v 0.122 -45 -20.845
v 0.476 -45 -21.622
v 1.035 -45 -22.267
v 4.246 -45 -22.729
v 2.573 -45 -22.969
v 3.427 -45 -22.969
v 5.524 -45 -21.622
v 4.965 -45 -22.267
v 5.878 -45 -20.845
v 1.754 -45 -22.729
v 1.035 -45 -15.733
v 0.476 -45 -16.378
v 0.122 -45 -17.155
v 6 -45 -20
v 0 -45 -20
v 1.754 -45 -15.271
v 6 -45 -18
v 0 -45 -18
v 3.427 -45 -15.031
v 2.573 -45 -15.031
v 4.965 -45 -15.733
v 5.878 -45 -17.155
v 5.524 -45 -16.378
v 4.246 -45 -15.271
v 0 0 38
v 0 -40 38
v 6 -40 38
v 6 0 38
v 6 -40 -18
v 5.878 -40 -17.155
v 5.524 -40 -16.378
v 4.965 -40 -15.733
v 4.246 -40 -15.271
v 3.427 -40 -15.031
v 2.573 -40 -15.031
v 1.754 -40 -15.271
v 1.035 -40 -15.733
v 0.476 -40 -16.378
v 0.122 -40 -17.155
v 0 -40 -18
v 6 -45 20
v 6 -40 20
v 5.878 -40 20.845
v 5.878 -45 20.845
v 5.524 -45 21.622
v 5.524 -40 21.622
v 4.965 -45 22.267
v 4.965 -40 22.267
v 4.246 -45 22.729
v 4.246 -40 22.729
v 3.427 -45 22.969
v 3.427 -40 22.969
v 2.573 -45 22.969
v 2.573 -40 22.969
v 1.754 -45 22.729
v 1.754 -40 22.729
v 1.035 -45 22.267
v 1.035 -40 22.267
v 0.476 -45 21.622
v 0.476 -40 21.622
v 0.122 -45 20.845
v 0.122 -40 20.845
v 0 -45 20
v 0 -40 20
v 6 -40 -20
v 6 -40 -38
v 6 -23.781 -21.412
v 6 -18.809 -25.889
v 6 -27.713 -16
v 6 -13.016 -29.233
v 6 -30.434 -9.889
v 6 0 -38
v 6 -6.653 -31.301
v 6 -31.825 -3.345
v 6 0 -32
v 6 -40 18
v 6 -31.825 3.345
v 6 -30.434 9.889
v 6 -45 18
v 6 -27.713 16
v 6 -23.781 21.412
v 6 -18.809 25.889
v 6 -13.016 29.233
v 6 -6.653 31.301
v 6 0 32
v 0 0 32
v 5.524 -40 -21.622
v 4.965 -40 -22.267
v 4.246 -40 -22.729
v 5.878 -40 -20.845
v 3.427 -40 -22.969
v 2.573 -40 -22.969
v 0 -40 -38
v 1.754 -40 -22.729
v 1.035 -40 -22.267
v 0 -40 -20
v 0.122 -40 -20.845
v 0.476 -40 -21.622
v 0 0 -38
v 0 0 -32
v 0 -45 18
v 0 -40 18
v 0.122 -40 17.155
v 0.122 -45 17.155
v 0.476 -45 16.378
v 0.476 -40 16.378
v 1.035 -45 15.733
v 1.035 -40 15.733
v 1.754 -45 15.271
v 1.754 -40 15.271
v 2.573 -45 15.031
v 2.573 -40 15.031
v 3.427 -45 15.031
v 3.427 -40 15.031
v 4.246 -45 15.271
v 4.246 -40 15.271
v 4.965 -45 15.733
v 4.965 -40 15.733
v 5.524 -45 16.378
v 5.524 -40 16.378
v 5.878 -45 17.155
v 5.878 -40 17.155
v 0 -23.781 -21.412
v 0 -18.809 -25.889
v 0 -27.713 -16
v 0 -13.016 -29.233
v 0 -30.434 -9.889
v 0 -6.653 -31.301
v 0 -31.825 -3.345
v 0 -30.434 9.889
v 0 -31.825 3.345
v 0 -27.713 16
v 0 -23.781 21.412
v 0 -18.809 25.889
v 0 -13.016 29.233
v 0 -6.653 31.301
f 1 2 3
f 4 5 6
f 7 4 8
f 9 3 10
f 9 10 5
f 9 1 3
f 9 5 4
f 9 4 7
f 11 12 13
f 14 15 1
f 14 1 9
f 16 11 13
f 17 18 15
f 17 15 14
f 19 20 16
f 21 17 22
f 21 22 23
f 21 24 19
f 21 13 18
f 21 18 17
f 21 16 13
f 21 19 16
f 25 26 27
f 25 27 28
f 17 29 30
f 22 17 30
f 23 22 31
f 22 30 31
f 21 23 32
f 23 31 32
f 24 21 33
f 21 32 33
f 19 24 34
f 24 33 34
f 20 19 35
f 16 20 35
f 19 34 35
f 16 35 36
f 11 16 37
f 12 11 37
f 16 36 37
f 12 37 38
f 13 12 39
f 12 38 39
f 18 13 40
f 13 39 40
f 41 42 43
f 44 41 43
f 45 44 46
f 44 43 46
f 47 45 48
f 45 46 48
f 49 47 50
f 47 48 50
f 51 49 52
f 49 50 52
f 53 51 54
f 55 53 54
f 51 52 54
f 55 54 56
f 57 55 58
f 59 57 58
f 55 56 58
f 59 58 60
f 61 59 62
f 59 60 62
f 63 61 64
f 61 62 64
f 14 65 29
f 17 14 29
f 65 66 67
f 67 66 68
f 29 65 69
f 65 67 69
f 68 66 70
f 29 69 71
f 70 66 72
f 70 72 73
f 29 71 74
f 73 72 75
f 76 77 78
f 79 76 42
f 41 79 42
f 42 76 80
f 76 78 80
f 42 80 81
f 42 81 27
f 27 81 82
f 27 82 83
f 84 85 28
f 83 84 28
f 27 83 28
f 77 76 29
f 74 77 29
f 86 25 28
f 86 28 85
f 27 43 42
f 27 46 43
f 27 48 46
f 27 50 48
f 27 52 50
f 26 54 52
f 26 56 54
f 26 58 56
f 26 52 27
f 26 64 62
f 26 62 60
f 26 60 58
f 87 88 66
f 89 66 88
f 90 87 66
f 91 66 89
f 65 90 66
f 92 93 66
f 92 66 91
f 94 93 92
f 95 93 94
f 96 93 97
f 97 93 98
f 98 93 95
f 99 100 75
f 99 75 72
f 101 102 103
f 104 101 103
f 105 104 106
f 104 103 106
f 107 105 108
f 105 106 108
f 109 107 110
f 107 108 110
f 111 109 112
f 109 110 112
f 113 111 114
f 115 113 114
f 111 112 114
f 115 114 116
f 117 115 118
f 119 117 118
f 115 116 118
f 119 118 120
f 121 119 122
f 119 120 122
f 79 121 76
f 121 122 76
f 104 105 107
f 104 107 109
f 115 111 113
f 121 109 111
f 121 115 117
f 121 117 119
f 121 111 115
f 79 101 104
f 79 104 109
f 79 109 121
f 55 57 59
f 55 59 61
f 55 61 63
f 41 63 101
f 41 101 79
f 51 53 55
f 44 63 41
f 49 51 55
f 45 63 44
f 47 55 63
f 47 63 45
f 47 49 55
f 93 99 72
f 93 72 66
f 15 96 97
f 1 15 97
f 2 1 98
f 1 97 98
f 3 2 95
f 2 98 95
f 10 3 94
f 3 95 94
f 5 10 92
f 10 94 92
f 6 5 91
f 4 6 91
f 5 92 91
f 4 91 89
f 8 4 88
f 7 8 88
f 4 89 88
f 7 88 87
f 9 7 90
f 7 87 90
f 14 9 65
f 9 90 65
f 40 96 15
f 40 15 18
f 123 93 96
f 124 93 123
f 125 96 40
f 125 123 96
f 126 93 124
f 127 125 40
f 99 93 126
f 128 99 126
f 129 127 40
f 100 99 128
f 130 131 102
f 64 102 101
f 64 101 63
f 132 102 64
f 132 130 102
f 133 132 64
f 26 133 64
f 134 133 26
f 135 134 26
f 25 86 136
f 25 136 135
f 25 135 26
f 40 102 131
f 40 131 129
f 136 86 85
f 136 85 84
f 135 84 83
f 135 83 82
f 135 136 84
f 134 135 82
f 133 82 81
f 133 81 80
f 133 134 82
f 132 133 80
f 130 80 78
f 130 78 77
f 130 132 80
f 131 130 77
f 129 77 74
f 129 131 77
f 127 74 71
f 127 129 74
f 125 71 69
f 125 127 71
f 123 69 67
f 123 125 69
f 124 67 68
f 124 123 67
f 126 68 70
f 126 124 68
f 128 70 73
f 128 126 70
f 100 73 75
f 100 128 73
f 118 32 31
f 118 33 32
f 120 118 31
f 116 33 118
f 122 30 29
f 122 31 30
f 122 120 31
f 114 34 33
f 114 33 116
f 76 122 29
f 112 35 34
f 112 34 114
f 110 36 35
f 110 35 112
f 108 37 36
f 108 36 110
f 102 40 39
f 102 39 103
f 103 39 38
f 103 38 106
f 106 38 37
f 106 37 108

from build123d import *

# Parameters (mm, degrees)
BOSS_EXTRUDE1_DEPTH = 6
BOSS_EXTRUDE2_DEPTH = 5


with BuildPart() as part:
    # Sketch1 → Boss-Extrude1 (new body)
    with BuildSketch(Plane(origin=(0, 0, 0), x_dir=(0, 0, -1), z_dir=(1, 0, 0))):
        with BuildLine():
            Line((-38, 0), (-32, 0))
            ThreePointArc((-32, 0), (0, -32), (32, 0))
            Line((32, 0), (38, 0))
            Line((38, 0), (38, -40))
            Line((38, -40), (-38, -40))
            Line((-38, -40), (-38, 0))
        make_face()
    extrude(amount=BOSS_EXTRUDE1_DEPTH)

    # Sketch3 → Boss-Extrude2 (add)
    with BuildSketch(Plane.XZ.offset(40)):
        with BuildLine():
            Line((0, 20), (0, 18))
            ThreePointArc((0, 18), (3, 15), (6, 18))
            Line((6, 18), (6, 20))
            ThreePointArc((6, 20), (3, 23), (0, 20))
        make_face()
        with BuildLine():
            Line((0, -18), (0, -20))
            ThreePointArc((0, -20), (3, -23), (6, -20))
            Line((6, -20), (6, -18))
            ThreePointArc((6, -18), (3, -15), (0, -18))
        make_face()
    extrude(amount=BOSS_EXTRUDE2_DEPTH)


solid = part.part
